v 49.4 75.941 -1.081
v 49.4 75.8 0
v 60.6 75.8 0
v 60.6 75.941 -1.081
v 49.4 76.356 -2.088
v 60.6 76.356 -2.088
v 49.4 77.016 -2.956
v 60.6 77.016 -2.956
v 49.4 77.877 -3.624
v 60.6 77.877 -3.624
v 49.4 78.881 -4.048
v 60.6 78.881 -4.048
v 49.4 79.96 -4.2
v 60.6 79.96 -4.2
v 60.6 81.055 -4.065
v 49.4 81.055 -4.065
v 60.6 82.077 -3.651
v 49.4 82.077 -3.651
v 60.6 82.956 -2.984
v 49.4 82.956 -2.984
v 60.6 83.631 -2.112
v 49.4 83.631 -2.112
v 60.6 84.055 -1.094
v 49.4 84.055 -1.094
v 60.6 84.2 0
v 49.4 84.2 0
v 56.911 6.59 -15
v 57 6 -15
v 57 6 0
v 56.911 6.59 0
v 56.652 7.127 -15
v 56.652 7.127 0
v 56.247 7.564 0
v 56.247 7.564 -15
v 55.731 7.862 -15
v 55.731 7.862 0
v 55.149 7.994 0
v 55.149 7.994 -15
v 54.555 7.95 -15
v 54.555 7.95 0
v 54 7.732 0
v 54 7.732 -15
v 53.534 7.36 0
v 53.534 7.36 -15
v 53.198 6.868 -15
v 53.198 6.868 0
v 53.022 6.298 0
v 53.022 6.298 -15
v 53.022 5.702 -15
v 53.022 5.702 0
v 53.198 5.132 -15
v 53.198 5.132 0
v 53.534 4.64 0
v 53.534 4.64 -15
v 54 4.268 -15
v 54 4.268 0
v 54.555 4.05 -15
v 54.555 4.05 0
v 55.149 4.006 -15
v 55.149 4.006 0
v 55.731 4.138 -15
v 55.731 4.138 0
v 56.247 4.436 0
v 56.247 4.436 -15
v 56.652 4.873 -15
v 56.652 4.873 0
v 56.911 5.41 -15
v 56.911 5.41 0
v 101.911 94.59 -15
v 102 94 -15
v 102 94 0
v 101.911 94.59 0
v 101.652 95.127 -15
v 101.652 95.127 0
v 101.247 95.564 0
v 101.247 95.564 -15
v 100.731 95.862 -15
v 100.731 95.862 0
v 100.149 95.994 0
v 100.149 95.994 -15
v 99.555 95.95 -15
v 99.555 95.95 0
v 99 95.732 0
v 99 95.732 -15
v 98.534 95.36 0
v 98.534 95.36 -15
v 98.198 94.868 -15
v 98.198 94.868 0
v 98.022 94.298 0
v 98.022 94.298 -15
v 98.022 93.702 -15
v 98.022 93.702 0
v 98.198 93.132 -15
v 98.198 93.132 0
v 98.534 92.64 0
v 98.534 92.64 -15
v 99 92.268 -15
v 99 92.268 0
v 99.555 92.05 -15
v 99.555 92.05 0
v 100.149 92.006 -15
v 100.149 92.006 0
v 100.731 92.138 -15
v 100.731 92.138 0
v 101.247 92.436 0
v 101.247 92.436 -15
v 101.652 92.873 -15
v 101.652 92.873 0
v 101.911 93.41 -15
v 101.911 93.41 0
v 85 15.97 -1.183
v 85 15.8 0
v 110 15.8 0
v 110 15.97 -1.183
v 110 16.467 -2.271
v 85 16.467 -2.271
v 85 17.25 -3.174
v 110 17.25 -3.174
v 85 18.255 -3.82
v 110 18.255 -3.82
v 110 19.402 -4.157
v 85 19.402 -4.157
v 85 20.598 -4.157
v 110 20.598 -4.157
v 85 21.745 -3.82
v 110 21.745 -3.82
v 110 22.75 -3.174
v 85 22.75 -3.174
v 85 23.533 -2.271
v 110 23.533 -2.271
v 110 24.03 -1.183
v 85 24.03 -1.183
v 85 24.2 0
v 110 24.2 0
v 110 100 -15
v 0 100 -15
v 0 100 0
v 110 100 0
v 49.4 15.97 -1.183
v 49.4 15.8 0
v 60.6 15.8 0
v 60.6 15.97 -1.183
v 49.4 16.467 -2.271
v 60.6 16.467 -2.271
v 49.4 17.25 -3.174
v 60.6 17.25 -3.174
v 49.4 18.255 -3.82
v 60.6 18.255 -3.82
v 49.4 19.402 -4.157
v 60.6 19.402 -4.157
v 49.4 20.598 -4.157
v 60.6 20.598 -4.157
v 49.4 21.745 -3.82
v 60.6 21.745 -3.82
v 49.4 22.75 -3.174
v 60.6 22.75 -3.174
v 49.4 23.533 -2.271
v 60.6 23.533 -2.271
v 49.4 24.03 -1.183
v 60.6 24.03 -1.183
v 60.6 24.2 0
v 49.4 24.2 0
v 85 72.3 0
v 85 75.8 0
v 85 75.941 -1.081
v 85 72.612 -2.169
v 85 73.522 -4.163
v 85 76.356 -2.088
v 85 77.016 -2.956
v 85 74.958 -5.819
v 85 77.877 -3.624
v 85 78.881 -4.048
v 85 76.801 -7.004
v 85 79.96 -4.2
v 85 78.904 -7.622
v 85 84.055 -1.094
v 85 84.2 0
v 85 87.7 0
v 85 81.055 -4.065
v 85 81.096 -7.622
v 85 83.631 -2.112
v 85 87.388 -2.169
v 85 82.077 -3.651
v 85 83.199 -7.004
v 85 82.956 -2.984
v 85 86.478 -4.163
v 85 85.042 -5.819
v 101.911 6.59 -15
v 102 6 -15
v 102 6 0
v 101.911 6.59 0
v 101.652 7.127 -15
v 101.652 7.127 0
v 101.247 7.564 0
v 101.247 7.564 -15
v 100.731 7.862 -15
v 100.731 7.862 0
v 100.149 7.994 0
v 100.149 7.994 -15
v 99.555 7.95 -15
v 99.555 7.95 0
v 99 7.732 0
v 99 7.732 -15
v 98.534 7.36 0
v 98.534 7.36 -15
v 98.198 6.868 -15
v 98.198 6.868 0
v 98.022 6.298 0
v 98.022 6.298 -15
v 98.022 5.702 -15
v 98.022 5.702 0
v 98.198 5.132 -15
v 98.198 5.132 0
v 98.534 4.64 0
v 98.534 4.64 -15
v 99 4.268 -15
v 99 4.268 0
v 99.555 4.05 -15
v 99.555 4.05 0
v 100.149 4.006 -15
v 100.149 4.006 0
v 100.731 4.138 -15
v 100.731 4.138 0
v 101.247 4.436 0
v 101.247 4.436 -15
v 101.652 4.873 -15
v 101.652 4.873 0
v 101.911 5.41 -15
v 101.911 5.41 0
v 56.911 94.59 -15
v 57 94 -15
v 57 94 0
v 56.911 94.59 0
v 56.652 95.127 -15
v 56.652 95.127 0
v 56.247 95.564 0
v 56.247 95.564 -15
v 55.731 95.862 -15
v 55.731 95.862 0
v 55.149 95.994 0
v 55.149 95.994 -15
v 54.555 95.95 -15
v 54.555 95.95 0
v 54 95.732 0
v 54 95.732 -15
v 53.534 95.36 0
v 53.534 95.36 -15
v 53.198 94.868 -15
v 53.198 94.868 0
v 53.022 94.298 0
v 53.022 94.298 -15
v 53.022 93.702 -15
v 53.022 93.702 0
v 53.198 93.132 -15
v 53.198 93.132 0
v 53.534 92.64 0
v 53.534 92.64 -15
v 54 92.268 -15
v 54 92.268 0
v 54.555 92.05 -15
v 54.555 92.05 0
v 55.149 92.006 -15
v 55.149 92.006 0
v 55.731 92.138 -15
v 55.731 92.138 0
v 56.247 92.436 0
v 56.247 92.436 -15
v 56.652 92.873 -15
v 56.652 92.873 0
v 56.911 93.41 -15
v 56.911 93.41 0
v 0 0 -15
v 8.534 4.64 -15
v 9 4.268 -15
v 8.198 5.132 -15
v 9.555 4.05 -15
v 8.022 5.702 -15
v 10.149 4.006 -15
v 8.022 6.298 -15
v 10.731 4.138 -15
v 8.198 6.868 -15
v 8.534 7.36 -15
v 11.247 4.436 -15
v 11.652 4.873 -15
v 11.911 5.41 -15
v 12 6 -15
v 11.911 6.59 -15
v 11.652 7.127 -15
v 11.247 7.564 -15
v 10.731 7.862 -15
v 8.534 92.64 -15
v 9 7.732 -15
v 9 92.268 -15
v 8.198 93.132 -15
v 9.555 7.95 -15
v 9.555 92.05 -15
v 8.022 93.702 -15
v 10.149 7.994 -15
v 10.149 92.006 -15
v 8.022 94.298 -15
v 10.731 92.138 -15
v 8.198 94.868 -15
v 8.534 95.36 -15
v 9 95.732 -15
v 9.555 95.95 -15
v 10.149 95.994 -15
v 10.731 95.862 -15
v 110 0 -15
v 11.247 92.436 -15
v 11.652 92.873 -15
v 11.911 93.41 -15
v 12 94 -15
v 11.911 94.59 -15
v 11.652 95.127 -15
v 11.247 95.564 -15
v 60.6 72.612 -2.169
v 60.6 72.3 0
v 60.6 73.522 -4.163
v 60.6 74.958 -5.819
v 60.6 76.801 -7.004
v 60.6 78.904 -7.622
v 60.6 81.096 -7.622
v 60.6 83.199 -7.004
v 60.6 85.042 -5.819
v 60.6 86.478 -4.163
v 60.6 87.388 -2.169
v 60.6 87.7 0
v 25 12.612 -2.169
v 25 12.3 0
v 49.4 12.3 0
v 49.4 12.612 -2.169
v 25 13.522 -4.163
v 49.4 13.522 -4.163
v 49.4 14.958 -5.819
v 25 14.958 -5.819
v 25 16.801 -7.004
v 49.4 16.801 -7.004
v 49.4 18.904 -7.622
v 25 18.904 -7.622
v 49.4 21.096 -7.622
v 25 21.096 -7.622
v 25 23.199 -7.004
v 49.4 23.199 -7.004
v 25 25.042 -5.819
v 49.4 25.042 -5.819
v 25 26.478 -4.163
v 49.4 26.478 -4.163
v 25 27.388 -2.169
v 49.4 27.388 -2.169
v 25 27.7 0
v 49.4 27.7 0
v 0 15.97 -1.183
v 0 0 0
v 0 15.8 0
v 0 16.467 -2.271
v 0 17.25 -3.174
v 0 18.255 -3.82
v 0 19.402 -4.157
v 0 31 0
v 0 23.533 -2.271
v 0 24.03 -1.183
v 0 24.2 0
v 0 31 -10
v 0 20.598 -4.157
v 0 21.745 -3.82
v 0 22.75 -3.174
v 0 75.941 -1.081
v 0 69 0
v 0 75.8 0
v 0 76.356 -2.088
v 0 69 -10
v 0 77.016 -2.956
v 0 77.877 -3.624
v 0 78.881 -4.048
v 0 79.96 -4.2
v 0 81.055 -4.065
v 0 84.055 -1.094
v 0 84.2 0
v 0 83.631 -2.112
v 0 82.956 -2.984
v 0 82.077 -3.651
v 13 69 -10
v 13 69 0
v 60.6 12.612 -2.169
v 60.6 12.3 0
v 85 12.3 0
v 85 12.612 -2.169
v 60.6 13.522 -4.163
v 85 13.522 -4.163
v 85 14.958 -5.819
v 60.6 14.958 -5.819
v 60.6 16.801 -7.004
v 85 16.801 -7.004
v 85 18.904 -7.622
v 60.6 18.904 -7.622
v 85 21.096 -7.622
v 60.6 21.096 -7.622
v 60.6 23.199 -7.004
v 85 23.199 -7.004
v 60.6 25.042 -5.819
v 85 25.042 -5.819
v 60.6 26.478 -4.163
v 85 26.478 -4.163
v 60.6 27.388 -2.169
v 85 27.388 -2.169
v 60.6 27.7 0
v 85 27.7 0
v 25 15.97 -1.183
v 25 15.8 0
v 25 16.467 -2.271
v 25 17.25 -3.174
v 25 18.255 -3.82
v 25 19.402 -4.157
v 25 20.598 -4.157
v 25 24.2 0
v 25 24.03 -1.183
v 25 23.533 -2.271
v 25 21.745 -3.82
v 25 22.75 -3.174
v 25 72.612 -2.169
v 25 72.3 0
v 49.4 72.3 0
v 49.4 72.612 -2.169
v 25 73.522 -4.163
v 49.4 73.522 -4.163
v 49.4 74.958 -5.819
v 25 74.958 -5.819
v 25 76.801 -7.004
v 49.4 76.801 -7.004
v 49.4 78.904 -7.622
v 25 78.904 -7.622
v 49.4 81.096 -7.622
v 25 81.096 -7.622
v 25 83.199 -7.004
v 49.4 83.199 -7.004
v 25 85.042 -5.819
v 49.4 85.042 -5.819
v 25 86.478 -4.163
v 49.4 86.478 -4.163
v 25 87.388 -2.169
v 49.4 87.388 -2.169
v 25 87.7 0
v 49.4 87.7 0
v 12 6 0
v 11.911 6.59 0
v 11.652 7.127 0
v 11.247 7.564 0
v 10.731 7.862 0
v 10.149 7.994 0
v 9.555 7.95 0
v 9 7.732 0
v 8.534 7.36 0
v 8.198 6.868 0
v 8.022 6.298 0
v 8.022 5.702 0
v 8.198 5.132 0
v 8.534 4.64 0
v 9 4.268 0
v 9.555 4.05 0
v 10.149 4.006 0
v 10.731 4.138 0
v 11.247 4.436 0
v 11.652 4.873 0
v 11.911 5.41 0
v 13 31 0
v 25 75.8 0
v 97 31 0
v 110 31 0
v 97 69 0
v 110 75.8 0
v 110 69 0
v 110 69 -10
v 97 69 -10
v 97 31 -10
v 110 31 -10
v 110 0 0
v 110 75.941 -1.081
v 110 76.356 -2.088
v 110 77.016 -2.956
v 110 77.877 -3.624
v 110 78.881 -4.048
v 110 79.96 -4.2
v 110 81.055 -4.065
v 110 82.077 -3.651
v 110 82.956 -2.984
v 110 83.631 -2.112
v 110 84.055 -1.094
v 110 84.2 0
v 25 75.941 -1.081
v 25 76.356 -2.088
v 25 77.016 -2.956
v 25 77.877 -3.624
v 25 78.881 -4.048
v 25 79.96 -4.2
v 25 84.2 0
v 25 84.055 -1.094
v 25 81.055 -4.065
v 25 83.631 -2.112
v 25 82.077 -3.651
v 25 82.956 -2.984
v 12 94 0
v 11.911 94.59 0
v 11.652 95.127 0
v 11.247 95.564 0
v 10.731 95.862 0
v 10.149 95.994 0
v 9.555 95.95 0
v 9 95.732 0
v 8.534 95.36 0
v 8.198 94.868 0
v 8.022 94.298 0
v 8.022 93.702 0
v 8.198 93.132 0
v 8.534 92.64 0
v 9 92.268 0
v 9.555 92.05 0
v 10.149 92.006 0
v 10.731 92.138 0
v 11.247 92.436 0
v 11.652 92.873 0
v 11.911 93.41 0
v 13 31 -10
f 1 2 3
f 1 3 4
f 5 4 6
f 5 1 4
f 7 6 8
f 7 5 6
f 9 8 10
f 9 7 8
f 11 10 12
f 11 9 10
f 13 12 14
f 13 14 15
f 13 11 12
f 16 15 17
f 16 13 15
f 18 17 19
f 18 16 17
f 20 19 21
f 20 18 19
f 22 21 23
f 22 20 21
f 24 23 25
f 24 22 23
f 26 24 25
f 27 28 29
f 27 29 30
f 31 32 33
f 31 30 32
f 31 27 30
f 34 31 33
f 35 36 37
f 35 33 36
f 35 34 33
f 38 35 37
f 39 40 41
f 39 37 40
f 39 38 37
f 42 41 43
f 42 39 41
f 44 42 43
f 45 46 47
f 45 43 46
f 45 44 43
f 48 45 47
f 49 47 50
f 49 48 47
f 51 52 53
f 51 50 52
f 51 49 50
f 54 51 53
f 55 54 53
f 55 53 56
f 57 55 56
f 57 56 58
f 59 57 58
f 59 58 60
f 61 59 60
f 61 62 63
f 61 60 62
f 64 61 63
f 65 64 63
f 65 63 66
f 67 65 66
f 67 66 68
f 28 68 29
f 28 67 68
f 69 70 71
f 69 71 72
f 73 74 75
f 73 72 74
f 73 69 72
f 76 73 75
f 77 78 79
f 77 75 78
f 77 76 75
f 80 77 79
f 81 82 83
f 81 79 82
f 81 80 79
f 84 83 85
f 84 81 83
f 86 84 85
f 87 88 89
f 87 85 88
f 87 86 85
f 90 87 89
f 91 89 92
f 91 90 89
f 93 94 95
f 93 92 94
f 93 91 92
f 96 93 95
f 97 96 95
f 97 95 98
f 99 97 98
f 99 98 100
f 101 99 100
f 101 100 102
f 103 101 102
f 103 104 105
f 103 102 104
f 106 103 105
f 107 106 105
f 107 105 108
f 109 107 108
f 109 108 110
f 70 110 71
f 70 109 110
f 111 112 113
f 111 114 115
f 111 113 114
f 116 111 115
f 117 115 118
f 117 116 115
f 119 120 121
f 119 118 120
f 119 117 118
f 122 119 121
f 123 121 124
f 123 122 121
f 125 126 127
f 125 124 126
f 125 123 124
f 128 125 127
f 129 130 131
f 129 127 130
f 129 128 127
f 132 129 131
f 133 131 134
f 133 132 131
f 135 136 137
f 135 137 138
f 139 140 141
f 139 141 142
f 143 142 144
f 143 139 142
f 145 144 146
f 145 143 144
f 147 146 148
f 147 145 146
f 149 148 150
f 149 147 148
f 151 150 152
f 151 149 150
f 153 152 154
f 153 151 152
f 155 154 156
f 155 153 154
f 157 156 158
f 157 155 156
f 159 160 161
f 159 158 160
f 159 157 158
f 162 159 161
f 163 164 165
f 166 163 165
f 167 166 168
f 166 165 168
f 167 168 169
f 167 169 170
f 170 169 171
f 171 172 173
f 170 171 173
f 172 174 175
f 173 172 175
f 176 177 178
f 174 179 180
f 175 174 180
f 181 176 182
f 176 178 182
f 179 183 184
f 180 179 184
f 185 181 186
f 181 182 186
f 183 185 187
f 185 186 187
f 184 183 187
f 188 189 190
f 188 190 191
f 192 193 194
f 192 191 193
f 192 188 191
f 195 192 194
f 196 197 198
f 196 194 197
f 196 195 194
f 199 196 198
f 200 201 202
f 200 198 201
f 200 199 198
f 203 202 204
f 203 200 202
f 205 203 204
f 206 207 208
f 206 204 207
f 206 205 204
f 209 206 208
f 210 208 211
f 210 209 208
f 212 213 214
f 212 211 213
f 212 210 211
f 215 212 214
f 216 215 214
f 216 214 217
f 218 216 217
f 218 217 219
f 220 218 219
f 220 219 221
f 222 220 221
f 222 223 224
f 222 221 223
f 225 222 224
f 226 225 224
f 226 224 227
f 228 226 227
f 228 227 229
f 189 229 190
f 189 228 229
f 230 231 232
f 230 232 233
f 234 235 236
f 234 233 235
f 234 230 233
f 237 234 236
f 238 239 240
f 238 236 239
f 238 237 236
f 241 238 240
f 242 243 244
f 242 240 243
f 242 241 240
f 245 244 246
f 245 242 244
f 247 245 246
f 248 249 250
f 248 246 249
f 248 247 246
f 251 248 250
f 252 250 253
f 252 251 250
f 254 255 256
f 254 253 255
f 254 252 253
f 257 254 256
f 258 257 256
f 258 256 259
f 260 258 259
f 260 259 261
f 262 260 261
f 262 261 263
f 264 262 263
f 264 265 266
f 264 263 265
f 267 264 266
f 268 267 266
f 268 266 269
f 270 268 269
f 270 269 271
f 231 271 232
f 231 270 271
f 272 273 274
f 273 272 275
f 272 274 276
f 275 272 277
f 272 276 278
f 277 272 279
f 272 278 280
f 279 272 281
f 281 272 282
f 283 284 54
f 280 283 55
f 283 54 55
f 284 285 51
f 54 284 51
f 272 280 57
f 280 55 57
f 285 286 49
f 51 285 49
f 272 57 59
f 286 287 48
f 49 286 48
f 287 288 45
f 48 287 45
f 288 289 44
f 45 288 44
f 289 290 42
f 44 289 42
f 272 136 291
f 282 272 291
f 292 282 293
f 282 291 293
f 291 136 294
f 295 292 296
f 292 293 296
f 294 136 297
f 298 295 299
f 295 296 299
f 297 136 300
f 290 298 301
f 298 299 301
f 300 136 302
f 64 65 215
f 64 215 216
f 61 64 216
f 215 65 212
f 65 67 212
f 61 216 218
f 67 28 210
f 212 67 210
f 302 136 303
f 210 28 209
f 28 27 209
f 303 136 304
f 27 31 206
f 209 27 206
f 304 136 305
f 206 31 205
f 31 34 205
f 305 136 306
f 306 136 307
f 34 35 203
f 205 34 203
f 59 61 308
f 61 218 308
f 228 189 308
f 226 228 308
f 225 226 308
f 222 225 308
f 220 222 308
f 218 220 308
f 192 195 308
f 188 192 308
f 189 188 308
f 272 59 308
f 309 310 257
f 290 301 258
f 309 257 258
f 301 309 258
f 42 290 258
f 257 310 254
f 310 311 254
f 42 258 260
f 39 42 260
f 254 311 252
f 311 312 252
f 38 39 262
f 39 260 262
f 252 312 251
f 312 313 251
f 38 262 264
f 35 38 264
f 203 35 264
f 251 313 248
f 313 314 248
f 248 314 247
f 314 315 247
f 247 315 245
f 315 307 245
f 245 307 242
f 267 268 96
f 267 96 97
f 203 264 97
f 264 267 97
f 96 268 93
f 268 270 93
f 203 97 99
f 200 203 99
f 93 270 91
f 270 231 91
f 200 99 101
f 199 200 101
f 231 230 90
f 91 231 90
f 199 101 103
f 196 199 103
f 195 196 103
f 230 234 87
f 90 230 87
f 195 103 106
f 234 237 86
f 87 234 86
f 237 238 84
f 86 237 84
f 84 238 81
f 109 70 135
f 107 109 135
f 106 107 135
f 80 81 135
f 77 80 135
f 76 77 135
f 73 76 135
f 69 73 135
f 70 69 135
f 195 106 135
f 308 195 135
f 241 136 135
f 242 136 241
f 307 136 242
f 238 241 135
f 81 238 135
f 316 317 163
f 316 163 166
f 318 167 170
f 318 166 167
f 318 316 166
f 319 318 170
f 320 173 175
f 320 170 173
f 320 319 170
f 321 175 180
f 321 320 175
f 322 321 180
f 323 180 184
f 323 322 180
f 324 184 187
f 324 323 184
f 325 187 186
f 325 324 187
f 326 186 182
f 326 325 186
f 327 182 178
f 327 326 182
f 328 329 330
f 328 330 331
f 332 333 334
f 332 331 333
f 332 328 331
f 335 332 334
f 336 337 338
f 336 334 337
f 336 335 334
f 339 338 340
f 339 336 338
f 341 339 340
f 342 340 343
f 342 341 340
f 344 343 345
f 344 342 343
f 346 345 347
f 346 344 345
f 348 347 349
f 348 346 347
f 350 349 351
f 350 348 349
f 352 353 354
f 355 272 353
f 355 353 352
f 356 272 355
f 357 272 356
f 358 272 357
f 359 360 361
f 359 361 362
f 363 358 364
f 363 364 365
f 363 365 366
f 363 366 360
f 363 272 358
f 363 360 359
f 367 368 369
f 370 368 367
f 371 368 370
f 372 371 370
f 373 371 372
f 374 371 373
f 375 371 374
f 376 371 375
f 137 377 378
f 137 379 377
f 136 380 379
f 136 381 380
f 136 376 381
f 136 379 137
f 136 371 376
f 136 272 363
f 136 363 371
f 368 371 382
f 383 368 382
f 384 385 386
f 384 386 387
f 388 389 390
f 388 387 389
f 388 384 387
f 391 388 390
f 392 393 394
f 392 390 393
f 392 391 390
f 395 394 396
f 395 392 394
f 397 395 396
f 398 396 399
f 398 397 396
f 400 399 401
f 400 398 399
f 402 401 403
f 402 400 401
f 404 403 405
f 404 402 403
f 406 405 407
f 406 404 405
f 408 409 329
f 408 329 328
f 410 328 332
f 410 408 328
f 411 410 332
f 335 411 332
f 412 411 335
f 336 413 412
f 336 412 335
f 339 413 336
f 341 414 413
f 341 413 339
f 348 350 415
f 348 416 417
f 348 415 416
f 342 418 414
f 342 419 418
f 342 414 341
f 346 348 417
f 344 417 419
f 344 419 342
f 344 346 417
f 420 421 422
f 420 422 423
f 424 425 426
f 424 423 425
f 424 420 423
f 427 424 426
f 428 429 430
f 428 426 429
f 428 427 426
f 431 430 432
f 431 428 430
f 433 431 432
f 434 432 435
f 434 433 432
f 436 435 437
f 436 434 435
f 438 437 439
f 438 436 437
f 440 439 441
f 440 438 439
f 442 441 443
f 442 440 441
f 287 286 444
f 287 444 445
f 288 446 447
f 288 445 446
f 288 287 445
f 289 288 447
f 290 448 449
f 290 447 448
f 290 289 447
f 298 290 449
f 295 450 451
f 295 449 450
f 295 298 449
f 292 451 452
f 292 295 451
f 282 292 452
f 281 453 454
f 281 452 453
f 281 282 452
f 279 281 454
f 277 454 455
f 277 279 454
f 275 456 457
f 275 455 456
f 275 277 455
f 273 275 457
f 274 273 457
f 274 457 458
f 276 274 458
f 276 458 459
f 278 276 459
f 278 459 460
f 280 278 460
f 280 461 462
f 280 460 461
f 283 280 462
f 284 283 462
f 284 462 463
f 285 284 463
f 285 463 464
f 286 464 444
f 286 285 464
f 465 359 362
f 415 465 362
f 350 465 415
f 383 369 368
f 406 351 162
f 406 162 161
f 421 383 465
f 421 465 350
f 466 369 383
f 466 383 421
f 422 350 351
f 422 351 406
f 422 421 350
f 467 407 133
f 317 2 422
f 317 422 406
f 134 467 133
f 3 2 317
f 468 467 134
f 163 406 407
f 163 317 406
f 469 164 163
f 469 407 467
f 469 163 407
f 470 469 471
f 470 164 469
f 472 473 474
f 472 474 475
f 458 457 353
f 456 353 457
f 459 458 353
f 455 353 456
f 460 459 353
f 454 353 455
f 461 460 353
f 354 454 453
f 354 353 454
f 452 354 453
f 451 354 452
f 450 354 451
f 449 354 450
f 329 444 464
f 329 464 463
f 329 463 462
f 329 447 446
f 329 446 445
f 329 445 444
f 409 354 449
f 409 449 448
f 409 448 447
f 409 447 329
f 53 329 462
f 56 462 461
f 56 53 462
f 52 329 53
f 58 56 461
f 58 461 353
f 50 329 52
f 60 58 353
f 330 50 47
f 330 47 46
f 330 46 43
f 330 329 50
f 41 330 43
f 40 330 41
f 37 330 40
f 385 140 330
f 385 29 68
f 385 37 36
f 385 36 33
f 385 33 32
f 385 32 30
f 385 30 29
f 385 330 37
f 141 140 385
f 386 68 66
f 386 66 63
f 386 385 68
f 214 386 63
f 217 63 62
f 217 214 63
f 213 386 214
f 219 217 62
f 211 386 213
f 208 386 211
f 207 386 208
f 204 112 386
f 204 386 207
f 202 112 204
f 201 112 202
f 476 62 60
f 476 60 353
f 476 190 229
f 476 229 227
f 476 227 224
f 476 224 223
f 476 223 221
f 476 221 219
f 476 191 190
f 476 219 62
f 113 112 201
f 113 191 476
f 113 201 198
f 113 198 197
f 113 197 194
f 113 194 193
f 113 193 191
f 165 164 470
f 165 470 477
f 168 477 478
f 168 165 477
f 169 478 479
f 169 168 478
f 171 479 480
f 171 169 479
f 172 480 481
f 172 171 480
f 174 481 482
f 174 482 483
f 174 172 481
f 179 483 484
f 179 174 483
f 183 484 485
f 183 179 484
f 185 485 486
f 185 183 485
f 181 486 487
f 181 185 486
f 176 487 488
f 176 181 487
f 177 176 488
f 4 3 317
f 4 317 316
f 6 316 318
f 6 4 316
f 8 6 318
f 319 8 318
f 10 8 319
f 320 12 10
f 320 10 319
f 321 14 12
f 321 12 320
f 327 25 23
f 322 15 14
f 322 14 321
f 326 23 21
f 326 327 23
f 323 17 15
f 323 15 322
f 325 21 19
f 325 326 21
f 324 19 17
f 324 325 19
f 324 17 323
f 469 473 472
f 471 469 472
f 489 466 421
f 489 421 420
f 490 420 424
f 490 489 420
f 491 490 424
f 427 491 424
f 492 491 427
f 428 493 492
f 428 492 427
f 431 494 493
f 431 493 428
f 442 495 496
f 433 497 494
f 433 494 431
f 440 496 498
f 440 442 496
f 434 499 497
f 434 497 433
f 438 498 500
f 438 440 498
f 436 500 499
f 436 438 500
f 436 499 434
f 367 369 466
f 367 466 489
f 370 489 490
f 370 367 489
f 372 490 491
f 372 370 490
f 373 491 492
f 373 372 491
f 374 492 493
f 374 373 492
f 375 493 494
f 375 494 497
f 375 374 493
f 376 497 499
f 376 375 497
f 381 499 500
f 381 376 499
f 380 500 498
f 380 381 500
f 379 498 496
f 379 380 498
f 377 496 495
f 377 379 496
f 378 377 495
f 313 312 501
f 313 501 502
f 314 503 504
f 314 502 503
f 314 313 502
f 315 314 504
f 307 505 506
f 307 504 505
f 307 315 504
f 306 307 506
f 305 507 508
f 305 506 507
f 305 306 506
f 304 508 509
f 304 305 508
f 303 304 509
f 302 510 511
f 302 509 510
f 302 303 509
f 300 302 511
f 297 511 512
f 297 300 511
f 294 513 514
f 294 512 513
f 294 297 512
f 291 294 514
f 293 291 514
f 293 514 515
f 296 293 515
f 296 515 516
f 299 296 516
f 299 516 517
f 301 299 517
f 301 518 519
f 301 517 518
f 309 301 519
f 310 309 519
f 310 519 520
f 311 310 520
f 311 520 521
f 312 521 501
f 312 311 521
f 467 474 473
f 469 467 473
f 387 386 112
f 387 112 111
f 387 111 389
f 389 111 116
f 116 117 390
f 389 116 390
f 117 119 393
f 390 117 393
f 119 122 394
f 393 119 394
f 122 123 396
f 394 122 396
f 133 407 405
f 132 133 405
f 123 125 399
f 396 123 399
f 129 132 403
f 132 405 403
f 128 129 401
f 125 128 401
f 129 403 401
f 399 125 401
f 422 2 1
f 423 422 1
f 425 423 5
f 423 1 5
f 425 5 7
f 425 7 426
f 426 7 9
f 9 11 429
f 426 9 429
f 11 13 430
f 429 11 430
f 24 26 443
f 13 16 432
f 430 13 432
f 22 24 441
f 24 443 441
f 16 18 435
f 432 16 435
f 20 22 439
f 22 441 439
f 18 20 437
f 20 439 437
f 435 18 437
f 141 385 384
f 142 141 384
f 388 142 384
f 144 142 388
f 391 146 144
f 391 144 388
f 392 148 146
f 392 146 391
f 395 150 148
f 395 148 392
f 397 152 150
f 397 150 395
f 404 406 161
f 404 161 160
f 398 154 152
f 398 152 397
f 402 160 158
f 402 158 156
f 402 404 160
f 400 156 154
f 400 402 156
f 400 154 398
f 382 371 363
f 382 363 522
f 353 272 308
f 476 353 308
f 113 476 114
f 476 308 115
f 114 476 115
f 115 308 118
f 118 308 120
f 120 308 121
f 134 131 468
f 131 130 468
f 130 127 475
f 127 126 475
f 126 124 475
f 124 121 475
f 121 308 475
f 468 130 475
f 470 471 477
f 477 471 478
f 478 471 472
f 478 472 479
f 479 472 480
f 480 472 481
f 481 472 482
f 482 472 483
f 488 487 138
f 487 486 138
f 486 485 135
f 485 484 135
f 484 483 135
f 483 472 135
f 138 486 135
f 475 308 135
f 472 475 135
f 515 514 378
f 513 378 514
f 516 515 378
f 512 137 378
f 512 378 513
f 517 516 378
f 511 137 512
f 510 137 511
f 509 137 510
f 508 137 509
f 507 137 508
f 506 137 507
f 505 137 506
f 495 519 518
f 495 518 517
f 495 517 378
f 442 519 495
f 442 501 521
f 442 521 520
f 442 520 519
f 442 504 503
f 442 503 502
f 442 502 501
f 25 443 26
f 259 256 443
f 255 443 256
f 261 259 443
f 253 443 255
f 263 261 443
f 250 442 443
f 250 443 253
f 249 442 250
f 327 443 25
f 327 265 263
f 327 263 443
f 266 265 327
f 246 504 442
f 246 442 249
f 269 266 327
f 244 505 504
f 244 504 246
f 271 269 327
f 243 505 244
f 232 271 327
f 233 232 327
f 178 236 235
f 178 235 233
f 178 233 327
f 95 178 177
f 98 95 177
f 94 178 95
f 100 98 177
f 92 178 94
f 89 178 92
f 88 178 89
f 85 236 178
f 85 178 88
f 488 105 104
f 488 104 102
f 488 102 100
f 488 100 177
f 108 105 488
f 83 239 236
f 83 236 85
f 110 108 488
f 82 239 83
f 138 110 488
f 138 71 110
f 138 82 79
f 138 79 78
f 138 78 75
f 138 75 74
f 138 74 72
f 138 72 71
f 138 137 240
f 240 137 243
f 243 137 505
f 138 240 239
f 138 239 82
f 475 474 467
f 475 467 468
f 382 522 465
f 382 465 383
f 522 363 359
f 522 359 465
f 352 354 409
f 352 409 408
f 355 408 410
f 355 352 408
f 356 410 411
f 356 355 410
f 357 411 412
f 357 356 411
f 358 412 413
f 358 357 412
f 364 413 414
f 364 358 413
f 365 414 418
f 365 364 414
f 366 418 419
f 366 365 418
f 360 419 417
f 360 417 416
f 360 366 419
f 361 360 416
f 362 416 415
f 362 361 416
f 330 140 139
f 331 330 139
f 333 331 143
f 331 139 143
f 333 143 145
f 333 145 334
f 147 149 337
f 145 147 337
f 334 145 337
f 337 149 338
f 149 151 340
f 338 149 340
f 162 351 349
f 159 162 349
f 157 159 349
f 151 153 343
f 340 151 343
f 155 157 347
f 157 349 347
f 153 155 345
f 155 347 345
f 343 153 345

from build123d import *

# Parameters (mm, degrees)
CYLINDER001_R               = 4.2
CYLINDER001_DEPTH           = 120
CYLINDER001_ROLL_ANGLE      = -89.998101
CYLINDER001_PITCH_ANGLE     = 89.45035
CYLINDER001_PLACEMENT_ANGLE = -89.998101
CYLINDER_R                  = 4.2
CYLINDER_DEPTH              = 120
CYLINDER_PITCH_ANGLE        = 90
CYLINDER008_R               = 2
CYLINDER008_DEPTH           = 80
ARRAY006_X_COUNT            = 3
ARRAY006_X_PITCH            = 45
CYLINDER010_R               = 2
CYLINDER010_DEPTH           = 80
ARRAY007_X_COUNT            = 3
ARRAY007_X_PITCH            = 45
CYLINDER009_R               = 7.7
CYLINDER009_DEPTH           = 24.4
CYLINDER009_PITCH_ANGLE     = 90
ARRAY005_X_COUNT            = 2
ARRAY005_X_PITCH            = 35.6
CYLINDER007_R               = 7.7
CYLINDER007_DEPTH           = 24.4
CYLINDER007_PITCH_ANGLE     = 90
ARRAY004_X_COUNT            = 2
ARRAY004_X_PITCH            = 35.6
BOX003_W                    = 40
BOX003_H                    = 38
BOX003_DEPTH                = 25
BOX002_W                    = 40
BOX002_H                    = 38
BOX002_DEPTH                = 25
BOX004_W                    = 110
BOX004_H                    = 100
BOX004_DEPTH                = 15


with BuildPart() as cylinder001:
    # Cylinder001 → Cylinder001 (new body)
    with BuildSketch(Plane.XY):
        Circle(CYLINDER001_R)
    extrude(amount=CYLINDER001_DEPTH)


with BuildPart() as cylinder001_1:
    # Cylinder001 roll: moved
    add(cylinder001.part.rotate(Axis((0, 0, 0), (1, 0, 0)), CYLINDER001_ROLL_ANGLE))


with BuildPart() as cylinder001_2:
    # Cylinder001 pitch: moved
    add(cylinder001_1.part.rotate(Axis((0, 0, 0), (0, 1, 0)), CYLINDER001_PITCH_ANGLE))


with BuildPart() as cylinder001_3:
    # Cylinder001 placement: moved
    add(cylinder001_2.part.moved(Location((-5, 80, 0))).rotate(Axis((-5, 80, 0), (0, 0, 1)), CYLINDER001_PLACEMENT_ANGLE))


with BuildPart() as ejes:
    # Cylinder → Cylinder (new body)
    with BuildSketch(Plane.XY):
        Circle(CYLINDER_R)
    extrude(amount=CYLINDER_DEPTH)


with BuildPart() as ejes_1:
    # Cylinder pitch: moved
    add(ejes.part.rotate(Axis((0, 0, 0), (0, 1, 0)), CYLINDER_PITCH_ANGLE))


with BuildPart() as ejes_2:
    # Cylinder placement: moved
    add(ejes_1.part.moved(Location((-5, 20, 0))))

    # Fusion001: union Cylinder001
    add(cylinder001_3.part)


with BuildPart() as array006:
    # Cylinder008 → Cylinder008 (new body)
    with BuildSketch(Plane(origin=(10, 6, -30), x_dir=(1, 0, 0), z_dir=(0, 0, 1))):
        Circle(CYLINDER008_R)
    extrude(amount=CYLINDER008_DEPTH)

    # Array006 X: Array006 ×3


with BuildPart() as array006_1:
    add(array006.part)
    with Locations(*[(i * ARRAY006_X_PITCH, 0, 0) for i in range(1, ARRAY006_X_COUNT)]):
        add(array006.part)


with BuildPart() as array007:
    # Cylinder010 → Cylinder010 (new body)
    with BuildSketch(Plane(origin=(10, 6, -30), x_dir=(1, 0, 0), z_dir=(0, 0, 1))):
        Circle(CYLINDER010_R)
    extrude(amount=CYLINDER010_DEPTH)

    # Array007 X: Array007 ×3


with BuildPart() as array007_1:
    add(array007.part)
    with Locations(*[(i * ARRAY007_X_PITCH, 0, 0) for i in range(1, ARRAY007_X_COUNT)]):
        add(array007.part)


with BuildPart() as array007_2:
    # Array007 placement: moved
    add(array007_1.part.moved(Location((0, 88, 0))))


with BuildPart() as array005:
    # Cylinder009 → Cylinder009 (new body)
    with BuildSketch(Plane.XY):
        Circle(CYLINDER009_R)
    extrude(amount=CYLINDER009_DEPTH)


with BuildPart() as array005_1:
    # Cylinder009 pitch: moved
    add(array005.part.rotate(Axis((0, 0, 0), (0, 1, 0)), CYLINDER009_PITCH_ANGLE))


with BuildPart() as array005_2:
    # Cylinder009 placement: moved
    add(array005_1.part.moved(Location((25, 80, 0))))

    # Array005 X: Array005 ×2


with BuildPart() as array005_3:
    add(array005_2.part)
    with Locations(*[(i * ARRAY005_X_PITCH, 0, 0) for i in range(1, ARRAY005_X_COUNT)]):
        add(array005_2.part)


with BuildPart() as taladros_tornillos_y_rodamientos001:
    # Cylinder007 → Cylinder007 (new body)
    with BuildSketch(Plane.XY):
        Circle(CYLINDER007_R)
    extrude(amount=CYLINDER007_DEPTH)


with BuildPart() as taladros_tornillos_y_rodamientos001_1:
    # Cylinder007 pitch: moved
    add(taladros_tornillos_y_rodamientos001.part.rotate(Axis((0, 0, 0), (0, 1, 0)), CYLINDER007_PITCH_ANGLE))


with BuildPart() as taladros_tornillos_y_rodamientos001_2:
    # Cylinder007 placement: moved
    add(taladros_tornillos_y_rodamientos001_1.part.moved(Location((25, 20, 0))))

    # Array004 X: Taladros tornillos y rodamientos001 ×2


with BuildPart() as taladros_tornillos_y_rodamientos001_3:
    add(taladros_tornillos_y_rodamientos001_2.part)
    with Locations(*[(i * ARRAY004_X_PITCH, 0, 0) for i in range(1, ARRAY004_X_COUNT)]):
        add(taladros_tornillos_y_rodamientos001_2.part)

    # Fusion005: union Array006, Array007, Array005
    add(array006_1.part)
    add(array007_2.part)
    add(array005_3.part)


with BuildPart() as cubo003:
    # Box003 → Box003 (new body)
    with BuildSketch(Plane(origin=(97, 31, -10), x_dir=(1, 0, 0), z_dir=(0, 0, 1))):
        with Locations((20, 19)):
            Rectangle(BOX003_W, BOX003_H)
    extrude(amount=BOX003_DEPTH)


with BuildPart() as fusion002:
    # Box002 → Box002 (new body)
    with BuildSketch(Plane(origin=(-27, 31, -10), x_dir=(1, 0, 0), z_dir=(0, 0, 1))):
        with Locations((20, 19)):
            Rectangle(BOX002_W, BOX002_H)
    extrude(amount=BOX002_DEPTH)

    # Fusion002: union Cubo003
    add(cubo003.part)


with BuildPart() as cut005:
    # Box004 → Box004 (new body)
    with BuildSketch(Plane.XY.offset(-15)):
        with Locations((55, 50)):
            Rectangle(BOX004_W, BOX004_H)
    extrude(amount=BOX004_DEPTH)

    # Cut: cut Fusion002
    add(fusion002.part, mode=Mode.SUBTRACT)

    # Cut003: cut Taladros tornillos y rodamientos001
    add(taladros_tornillos_y_rodamientos001_3.part, mode=Mode.SUBTRACT)

    # Cut005: cut Ejes
    add(ejes_2.part, mode=Mode.SUBTRACT)


solid = cut005.part
